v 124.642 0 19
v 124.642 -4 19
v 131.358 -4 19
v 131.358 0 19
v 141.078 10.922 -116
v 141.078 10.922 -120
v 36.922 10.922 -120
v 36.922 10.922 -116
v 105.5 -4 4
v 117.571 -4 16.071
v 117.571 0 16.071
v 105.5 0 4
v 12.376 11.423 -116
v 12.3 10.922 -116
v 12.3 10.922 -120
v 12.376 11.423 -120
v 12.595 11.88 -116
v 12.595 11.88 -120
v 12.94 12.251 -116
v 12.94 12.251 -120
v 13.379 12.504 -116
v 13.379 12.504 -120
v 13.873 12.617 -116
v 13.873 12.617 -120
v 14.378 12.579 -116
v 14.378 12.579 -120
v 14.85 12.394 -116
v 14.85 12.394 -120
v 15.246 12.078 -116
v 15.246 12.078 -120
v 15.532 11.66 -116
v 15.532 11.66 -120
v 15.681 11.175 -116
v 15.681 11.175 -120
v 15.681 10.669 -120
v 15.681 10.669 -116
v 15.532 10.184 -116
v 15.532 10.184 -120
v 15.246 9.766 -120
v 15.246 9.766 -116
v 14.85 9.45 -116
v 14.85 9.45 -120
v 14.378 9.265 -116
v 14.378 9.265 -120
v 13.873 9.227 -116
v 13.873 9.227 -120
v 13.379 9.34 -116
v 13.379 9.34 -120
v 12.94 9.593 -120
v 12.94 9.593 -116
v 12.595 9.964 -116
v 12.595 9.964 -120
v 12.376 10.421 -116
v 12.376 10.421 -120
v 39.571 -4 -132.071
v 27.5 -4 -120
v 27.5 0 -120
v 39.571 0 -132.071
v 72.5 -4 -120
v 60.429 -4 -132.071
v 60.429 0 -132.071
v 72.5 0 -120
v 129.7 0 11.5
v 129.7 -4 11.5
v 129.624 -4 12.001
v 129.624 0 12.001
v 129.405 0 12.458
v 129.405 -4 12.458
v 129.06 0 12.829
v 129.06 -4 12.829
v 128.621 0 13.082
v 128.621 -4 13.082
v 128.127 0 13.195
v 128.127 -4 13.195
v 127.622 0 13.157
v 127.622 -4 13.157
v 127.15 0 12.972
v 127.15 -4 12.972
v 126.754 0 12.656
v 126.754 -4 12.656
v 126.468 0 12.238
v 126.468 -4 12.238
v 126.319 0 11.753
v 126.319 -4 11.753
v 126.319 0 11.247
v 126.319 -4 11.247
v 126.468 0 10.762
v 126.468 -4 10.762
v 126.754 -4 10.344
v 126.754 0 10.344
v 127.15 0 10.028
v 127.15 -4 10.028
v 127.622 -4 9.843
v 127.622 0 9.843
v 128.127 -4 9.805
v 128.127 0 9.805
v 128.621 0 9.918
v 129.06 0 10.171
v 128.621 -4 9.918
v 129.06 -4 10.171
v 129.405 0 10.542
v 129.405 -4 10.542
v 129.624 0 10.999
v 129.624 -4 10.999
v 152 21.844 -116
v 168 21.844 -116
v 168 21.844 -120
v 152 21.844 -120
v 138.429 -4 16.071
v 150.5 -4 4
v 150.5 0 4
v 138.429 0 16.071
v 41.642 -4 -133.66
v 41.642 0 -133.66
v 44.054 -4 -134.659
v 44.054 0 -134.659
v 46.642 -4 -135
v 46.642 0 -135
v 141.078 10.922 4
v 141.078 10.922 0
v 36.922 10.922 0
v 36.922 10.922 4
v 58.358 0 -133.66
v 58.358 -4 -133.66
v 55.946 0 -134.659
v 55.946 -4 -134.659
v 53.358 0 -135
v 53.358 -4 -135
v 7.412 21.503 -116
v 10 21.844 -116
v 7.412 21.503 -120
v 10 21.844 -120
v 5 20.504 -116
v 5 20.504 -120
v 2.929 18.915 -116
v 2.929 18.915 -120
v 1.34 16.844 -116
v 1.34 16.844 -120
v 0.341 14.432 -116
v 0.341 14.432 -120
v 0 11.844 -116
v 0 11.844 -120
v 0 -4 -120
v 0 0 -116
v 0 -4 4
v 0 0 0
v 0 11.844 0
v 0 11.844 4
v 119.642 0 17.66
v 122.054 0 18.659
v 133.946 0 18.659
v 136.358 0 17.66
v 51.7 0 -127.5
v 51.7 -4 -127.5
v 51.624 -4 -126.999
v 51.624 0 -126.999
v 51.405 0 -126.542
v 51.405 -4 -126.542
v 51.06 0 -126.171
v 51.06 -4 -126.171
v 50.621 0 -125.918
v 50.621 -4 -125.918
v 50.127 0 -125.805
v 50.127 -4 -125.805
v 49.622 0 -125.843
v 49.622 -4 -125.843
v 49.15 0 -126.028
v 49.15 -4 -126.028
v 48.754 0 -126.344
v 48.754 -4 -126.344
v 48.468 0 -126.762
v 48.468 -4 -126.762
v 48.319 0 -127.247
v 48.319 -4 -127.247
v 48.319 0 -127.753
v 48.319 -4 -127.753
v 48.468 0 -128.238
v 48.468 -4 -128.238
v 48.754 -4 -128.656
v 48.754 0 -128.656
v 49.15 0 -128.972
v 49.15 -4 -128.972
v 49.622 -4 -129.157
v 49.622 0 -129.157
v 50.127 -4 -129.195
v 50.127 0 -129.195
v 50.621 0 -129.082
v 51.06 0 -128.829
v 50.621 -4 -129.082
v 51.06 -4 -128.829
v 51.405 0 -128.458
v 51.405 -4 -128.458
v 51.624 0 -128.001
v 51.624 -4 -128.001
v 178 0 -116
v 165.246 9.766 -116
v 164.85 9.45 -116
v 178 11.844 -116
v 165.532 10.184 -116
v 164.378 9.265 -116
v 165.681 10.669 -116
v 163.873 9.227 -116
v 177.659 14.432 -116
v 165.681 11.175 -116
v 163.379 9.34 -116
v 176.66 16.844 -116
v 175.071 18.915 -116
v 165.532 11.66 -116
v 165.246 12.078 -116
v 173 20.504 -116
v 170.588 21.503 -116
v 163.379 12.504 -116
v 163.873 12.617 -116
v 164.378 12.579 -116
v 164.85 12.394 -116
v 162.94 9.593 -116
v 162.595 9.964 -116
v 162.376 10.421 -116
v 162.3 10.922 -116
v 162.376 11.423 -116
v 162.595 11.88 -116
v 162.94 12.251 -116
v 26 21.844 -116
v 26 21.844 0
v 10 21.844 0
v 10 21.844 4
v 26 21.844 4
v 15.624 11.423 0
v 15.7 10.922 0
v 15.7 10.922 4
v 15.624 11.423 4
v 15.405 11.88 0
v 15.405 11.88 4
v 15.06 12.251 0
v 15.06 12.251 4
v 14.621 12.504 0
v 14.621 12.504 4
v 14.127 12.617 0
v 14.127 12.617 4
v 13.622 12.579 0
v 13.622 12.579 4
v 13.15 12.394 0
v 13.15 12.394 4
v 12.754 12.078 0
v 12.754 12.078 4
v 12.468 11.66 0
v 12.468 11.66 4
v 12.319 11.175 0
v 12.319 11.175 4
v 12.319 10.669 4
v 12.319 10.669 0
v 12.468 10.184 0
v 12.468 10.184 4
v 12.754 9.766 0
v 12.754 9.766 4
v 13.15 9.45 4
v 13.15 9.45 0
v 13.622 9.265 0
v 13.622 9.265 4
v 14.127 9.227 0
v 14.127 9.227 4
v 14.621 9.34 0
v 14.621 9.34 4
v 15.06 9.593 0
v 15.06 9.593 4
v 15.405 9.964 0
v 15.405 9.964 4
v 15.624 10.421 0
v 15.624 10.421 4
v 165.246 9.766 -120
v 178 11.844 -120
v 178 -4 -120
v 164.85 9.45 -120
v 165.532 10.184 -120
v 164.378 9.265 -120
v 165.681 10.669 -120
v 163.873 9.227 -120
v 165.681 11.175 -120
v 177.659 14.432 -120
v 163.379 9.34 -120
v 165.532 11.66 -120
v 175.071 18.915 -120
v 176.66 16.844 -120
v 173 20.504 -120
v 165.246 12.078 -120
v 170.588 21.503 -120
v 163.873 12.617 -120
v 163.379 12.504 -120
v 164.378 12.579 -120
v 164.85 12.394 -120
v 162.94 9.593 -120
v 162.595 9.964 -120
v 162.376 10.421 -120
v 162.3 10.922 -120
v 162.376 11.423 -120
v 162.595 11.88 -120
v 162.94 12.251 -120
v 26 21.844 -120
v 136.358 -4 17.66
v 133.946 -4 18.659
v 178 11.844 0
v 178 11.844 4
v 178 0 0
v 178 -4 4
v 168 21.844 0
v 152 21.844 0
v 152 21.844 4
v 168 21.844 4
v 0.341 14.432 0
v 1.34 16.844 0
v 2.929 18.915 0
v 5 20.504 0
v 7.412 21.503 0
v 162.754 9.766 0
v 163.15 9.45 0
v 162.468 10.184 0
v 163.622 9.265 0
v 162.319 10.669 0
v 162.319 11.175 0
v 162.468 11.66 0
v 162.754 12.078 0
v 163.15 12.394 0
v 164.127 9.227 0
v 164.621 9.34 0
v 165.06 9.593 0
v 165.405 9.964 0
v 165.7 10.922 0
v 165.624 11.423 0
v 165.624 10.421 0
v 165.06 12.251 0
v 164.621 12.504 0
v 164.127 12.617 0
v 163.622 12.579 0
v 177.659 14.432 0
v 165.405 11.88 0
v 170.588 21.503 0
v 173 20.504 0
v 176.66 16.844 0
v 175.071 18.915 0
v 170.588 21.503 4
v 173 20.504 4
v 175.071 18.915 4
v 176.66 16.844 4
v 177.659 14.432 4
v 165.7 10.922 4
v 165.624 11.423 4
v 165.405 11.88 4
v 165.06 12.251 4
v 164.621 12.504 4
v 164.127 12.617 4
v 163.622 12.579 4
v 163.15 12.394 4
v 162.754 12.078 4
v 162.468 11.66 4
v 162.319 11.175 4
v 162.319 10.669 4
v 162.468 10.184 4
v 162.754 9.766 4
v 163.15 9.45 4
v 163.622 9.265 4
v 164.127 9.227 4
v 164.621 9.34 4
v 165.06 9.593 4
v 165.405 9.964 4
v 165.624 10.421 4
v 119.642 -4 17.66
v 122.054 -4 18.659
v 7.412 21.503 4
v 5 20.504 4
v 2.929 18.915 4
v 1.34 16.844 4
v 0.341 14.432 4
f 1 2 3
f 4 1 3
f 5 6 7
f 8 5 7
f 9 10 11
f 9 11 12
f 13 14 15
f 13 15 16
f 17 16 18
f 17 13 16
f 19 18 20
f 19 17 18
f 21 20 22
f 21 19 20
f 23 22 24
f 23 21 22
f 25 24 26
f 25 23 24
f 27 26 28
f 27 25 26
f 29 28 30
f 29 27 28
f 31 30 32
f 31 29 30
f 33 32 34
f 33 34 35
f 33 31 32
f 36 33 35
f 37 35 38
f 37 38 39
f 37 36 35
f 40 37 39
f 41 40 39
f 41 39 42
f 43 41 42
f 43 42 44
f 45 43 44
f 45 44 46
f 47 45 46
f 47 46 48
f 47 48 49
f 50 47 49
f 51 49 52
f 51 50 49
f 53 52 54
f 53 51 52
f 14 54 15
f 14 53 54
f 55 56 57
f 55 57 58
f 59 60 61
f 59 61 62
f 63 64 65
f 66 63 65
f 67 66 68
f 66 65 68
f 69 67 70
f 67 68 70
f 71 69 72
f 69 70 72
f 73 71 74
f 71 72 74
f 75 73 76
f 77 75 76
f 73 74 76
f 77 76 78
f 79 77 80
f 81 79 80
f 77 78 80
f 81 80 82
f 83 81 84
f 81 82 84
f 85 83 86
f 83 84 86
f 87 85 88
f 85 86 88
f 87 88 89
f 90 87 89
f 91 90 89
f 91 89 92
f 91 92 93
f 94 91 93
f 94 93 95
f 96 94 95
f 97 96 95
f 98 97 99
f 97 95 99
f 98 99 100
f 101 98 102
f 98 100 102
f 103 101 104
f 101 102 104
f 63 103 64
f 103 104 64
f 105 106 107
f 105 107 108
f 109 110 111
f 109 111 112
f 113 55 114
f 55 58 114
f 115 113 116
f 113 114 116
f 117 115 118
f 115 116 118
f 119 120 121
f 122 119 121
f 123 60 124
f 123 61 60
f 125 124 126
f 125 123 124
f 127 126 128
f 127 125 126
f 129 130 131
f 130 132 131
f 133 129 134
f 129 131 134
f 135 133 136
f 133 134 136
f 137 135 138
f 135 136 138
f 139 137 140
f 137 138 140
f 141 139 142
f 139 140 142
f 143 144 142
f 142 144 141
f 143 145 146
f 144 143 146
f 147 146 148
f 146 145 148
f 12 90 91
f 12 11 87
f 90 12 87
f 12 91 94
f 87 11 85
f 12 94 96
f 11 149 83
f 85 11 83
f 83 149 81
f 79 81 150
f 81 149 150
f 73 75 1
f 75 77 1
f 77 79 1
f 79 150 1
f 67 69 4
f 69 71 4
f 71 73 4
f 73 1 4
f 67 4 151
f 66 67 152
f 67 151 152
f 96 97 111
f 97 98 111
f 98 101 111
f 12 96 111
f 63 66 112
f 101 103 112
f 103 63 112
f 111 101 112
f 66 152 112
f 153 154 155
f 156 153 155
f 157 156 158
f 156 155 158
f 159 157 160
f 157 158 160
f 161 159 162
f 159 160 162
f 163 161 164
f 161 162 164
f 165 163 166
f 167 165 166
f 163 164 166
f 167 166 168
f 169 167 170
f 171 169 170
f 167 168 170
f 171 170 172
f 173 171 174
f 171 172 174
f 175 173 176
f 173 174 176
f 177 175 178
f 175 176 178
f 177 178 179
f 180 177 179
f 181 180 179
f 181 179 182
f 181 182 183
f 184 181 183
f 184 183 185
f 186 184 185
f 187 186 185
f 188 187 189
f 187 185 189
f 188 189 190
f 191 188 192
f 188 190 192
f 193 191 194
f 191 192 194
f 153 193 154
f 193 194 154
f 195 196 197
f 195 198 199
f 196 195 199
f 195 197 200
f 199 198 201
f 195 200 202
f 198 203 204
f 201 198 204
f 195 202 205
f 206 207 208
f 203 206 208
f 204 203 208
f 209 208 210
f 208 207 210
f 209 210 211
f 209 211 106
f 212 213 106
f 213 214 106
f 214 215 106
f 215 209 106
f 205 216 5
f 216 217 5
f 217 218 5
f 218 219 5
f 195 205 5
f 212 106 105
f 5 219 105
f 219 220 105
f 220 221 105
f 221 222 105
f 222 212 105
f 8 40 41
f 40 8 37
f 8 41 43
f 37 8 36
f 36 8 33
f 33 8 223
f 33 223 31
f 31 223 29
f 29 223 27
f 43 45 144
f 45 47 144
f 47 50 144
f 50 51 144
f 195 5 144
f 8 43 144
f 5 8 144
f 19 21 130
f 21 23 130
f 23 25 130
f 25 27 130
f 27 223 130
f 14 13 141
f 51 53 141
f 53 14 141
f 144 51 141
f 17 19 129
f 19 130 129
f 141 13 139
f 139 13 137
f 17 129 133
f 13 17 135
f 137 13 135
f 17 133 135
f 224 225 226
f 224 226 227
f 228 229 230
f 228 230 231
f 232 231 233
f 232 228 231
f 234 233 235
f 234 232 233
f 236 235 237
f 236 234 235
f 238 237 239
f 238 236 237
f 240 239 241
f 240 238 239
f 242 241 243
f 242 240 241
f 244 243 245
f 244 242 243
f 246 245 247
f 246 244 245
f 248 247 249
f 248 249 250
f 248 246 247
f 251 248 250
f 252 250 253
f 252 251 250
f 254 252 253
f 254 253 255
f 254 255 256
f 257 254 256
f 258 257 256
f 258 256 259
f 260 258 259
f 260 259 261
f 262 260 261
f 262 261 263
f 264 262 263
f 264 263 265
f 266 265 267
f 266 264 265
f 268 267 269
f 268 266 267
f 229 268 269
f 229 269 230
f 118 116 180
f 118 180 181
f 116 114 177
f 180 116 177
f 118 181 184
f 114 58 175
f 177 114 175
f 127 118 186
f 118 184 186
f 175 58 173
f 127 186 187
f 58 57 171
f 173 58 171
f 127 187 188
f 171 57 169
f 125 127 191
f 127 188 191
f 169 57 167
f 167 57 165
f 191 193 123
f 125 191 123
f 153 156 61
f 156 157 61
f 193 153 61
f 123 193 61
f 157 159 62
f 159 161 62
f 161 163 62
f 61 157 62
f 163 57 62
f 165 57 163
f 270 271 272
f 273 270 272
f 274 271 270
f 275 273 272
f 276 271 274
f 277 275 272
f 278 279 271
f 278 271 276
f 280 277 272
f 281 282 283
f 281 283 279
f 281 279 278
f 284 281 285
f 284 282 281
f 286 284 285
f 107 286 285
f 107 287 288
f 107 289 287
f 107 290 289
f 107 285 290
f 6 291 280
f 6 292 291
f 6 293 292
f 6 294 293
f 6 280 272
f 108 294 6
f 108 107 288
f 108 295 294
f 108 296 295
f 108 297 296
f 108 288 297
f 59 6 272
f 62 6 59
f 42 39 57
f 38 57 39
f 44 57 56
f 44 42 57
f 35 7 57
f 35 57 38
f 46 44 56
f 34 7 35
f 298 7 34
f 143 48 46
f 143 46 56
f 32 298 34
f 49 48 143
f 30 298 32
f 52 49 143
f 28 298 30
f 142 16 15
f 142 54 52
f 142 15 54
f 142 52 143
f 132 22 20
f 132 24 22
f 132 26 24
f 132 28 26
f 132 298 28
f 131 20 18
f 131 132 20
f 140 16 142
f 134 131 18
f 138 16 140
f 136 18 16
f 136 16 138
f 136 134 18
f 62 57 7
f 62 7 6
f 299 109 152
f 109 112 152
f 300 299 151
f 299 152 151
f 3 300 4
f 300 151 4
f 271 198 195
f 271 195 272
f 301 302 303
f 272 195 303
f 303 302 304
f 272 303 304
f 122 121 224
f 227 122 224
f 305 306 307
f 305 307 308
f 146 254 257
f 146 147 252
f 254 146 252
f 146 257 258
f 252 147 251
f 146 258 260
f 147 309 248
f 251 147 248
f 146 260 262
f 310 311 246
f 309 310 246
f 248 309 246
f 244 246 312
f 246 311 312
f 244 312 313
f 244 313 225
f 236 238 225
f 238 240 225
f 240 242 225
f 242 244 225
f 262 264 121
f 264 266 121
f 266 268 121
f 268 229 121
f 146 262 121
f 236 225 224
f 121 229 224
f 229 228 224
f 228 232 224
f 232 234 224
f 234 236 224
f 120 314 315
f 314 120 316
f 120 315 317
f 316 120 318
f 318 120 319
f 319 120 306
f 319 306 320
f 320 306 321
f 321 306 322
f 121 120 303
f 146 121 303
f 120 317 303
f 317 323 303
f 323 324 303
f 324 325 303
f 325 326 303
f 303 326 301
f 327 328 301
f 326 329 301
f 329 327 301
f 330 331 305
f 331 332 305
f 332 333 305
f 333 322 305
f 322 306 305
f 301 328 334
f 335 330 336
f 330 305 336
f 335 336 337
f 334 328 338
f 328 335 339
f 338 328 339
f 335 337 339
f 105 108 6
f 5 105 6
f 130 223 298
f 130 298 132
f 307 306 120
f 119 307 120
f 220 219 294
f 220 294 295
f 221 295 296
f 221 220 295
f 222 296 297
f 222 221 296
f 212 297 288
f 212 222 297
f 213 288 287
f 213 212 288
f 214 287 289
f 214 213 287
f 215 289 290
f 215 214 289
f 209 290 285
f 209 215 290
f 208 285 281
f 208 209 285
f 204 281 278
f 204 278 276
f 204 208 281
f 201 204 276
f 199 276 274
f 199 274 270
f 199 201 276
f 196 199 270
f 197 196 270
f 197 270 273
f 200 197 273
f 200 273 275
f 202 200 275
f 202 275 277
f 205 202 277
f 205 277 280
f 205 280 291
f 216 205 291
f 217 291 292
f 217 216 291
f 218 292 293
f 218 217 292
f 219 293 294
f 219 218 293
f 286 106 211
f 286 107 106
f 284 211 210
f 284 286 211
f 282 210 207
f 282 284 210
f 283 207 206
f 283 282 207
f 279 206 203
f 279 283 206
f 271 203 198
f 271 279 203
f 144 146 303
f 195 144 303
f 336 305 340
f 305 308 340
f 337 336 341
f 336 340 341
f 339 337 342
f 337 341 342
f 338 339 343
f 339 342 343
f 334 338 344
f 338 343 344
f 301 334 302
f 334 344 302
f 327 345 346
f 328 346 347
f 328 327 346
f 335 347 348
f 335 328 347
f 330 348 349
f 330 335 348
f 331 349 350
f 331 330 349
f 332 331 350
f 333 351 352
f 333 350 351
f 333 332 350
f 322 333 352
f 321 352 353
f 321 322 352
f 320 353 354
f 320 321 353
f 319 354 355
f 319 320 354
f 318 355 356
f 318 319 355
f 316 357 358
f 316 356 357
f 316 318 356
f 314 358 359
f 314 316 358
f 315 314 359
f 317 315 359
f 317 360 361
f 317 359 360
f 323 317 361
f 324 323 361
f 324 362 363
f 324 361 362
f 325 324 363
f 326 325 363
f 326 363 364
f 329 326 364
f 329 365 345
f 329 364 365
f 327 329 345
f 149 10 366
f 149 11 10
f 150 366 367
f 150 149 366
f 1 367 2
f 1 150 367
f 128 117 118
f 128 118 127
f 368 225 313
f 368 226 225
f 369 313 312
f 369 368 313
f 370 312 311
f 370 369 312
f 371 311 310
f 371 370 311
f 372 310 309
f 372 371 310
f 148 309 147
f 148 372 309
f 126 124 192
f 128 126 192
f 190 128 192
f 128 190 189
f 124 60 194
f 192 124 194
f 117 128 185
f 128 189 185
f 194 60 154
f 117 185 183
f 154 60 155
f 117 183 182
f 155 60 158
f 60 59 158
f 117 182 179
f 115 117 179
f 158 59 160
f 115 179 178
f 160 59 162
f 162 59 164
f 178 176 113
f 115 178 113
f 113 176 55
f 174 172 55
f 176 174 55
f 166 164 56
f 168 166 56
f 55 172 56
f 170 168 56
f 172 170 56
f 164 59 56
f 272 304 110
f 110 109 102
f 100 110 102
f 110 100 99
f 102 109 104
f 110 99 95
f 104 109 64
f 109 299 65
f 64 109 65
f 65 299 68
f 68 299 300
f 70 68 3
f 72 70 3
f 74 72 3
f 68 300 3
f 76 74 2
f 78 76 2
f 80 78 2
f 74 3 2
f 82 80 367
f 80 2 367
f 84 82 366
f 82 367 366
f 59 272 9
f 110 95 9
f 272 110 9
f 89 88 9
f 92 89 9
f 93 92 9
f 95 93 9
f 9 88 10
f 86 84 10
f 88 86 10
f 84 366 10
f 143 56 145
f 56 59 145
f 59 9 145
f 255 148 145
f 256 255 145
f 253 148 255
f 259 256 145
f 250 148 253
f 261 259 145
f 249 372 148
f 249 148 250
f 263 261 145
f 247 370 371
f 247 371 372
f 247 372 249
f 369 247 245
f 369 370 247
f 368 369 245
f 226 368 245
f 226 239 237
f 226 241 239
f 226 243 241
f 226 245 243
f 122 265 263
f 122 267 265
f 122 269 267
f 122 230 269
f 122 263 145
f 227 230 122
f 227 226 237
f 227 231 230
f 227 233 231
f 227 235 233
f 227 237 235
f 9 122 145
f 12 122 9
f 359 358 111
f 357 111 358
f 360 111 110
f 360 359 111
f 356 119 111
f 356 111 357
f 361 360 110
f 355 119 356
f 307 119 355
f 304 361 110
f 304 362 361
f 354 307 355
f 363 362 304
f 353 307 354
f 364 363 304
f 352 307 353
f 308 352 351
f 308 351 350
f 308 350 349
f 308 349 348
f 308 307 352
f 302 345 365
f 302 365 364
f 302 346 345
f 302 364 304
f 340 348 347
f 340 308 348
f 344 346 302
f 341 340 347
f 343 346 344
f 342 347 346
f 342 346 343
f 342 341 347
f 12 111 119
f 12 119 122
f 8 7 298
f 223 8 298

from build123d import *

# Parameters (mm, degrees)
SKETCH1_W               = 178
SKETCH1_H               = 4
SKETCH1_H_2             = 21.844
SKETCH1_R               = 1.7
BOSS_EXTRUDE1_DEPTH     = 4
SKETCH1_3_W             = 178
SKETCH1_3_H             = 4
BOSS_EXTRUDE2_DEPTH     = 116
SKETCH2_W               = 178
SKETCH2_H               = 4
SKETCH2_H_2             = 21.844
SKETCH2_R               = 1.7
BOSS_EXTRUDE3_DEPTH     = 4
FILLET1_R               = 10
SKETCH3_W               = 15
SKETCH3_H               = 15
SKETCH3_R               = 1.7
BOSS_EXTRUDE4_DEPTH     = 4
FILLET2_R               = 10
SKETCH4_R               = 1.7
CUT_EXTRUDE1_DEPTH      = 16
CUT_EXTRUDE1_DEPTH_BACK = 140


with BuildPart() as part:
    # Sketch1 → Boss-Extrude1 (new body)
    with BuildSketch(Plane.XY):
        with Locations((89, -2)):
            Rectangle(SKETCH1_W, SKETCH1_H)
        with Locations((89, 10.922)):
            Rectangle(SKETCH1_W, SKETCH1_H_2)
        with Locations((164, 10.922)):
            Circle(SKETCH1_R, mode=Mode.SUBTRACT)
        with Locations((14, 10.922)):
            Circle(SKETCH1_R, mode=Mode.SUBTRACT)
    extrude(amount=BOSS_EXTRUDE1_DEPTH)

    # Sketch1<3> → Boss-Extrude2 (add)
    with BuildSketch(Plane.XY):
        with Locations((89, -2)):
            Rectangle(SKETCH1_3_W, SKETCH1_3_H)
    extrude(amount=-BOSS_EXTRUDE2_DEPTH)

    # Sketch2 → Boss-Extrude3 (add)
    with BuildSketch(Plane(origin=(0, 0, -116), x_dir=(-1, 0, 0), z_dir=(0, 0, -1))):
        with Locations((-89, -2)):
            Rectangle(SKETCH2_W, SKETCH2_H)
        with Locations((-89, 10.922)):
            Rectangle(SKETCH2_W, SKETCH2_H_2)
        with Locations((-164, 10.922)):
            Circle(SKETCH2_R, mode=Mode.SUBTRACT)
        with Locations((-14, 10.922)):
            Circle(SKETCH2_R, mode=Mode.SUBTRACT)
    extrude(amount=BOSS_EXTRUDE3_DEPTH)

    # Fillet1
    fillet1_edges = [part.edges().sort_by_distance(p)[0] for p in [
        (0, 21.844, 2),
        (178, 21.844, 2),
        (0, 21.844, -118),
        (178, 21.844, -118),
    ]]
    fillet(fillet1_edges, radius=FILLET1_R)

    # Sketch3 → Boss-Extrude4 (add)
    with BuildSketch(Plane.XZ.offset(4)):
        Polygon((42.5, -135), (42.5, -120), (27.5, -120), align=None)
        with Locations((50, -127.5)):
            Rectangle(SKETCH3_W, SKETCH3_H)
        with Locations((50, -127.5)):
            Circle(SKETCH3_R, mode=Mode.SUBTRACT)
        Polygon((72.5, -120), (57.5, -120), (57.5, -135), align=None)
        Polygon((105.5, 4), (120.5, 4), (120.5, 19), align=None)
        with Locations((128, 11.5)):
            Rectangle(SKETCH3_W, SKETCH3_H)
        with Locations((128, 11.5)):
            Circle(SKETCH3_R, mode=Mode.SUBTRACT)
        Polygon((135.5, 19), (135.5, 4), (150.5, 4), align=None)
    extrude(amount=-BOSS_EXTRUDE4_DEPTH)

    # Fillet2
    fillet2_edges = [part.edges().sort_by_distance(p)[0] for p in [
        (120.5, -2, 19),
        (135.5, -2, 19),
        (42.5, -2, -135),
        (57.5, -2, -135),
    ]]
    fillet(fillet2_edges, radius=FILLET2_R)

    # Sketch4 → Cut-Extrude1 (cut, two sides)
    with BuildSketch(Plane(origin=(0, 0, -120), x_dir=(-1, 0, 0), z_dir=(0, 0, -1))) as cut_extrude1_sk:
        with Locations((-164, 10.922)):
            Circle(SKETCH4_R)
        Polygon((-152, 21.844), (-141.078, 10.922), (-36.922, 10.922), (-26, 21.844), align=None)
    extrude(amount=CUT_EXTRUDE1_DEPTH, mode=Mode.SUBTRACT)
    extrude(cut_extrude1_sk.sketch, amount=-CUT_EXTRUDE1_DEPTH_BACK, mode=Mode.SUBTRACT)


solid = part.part
